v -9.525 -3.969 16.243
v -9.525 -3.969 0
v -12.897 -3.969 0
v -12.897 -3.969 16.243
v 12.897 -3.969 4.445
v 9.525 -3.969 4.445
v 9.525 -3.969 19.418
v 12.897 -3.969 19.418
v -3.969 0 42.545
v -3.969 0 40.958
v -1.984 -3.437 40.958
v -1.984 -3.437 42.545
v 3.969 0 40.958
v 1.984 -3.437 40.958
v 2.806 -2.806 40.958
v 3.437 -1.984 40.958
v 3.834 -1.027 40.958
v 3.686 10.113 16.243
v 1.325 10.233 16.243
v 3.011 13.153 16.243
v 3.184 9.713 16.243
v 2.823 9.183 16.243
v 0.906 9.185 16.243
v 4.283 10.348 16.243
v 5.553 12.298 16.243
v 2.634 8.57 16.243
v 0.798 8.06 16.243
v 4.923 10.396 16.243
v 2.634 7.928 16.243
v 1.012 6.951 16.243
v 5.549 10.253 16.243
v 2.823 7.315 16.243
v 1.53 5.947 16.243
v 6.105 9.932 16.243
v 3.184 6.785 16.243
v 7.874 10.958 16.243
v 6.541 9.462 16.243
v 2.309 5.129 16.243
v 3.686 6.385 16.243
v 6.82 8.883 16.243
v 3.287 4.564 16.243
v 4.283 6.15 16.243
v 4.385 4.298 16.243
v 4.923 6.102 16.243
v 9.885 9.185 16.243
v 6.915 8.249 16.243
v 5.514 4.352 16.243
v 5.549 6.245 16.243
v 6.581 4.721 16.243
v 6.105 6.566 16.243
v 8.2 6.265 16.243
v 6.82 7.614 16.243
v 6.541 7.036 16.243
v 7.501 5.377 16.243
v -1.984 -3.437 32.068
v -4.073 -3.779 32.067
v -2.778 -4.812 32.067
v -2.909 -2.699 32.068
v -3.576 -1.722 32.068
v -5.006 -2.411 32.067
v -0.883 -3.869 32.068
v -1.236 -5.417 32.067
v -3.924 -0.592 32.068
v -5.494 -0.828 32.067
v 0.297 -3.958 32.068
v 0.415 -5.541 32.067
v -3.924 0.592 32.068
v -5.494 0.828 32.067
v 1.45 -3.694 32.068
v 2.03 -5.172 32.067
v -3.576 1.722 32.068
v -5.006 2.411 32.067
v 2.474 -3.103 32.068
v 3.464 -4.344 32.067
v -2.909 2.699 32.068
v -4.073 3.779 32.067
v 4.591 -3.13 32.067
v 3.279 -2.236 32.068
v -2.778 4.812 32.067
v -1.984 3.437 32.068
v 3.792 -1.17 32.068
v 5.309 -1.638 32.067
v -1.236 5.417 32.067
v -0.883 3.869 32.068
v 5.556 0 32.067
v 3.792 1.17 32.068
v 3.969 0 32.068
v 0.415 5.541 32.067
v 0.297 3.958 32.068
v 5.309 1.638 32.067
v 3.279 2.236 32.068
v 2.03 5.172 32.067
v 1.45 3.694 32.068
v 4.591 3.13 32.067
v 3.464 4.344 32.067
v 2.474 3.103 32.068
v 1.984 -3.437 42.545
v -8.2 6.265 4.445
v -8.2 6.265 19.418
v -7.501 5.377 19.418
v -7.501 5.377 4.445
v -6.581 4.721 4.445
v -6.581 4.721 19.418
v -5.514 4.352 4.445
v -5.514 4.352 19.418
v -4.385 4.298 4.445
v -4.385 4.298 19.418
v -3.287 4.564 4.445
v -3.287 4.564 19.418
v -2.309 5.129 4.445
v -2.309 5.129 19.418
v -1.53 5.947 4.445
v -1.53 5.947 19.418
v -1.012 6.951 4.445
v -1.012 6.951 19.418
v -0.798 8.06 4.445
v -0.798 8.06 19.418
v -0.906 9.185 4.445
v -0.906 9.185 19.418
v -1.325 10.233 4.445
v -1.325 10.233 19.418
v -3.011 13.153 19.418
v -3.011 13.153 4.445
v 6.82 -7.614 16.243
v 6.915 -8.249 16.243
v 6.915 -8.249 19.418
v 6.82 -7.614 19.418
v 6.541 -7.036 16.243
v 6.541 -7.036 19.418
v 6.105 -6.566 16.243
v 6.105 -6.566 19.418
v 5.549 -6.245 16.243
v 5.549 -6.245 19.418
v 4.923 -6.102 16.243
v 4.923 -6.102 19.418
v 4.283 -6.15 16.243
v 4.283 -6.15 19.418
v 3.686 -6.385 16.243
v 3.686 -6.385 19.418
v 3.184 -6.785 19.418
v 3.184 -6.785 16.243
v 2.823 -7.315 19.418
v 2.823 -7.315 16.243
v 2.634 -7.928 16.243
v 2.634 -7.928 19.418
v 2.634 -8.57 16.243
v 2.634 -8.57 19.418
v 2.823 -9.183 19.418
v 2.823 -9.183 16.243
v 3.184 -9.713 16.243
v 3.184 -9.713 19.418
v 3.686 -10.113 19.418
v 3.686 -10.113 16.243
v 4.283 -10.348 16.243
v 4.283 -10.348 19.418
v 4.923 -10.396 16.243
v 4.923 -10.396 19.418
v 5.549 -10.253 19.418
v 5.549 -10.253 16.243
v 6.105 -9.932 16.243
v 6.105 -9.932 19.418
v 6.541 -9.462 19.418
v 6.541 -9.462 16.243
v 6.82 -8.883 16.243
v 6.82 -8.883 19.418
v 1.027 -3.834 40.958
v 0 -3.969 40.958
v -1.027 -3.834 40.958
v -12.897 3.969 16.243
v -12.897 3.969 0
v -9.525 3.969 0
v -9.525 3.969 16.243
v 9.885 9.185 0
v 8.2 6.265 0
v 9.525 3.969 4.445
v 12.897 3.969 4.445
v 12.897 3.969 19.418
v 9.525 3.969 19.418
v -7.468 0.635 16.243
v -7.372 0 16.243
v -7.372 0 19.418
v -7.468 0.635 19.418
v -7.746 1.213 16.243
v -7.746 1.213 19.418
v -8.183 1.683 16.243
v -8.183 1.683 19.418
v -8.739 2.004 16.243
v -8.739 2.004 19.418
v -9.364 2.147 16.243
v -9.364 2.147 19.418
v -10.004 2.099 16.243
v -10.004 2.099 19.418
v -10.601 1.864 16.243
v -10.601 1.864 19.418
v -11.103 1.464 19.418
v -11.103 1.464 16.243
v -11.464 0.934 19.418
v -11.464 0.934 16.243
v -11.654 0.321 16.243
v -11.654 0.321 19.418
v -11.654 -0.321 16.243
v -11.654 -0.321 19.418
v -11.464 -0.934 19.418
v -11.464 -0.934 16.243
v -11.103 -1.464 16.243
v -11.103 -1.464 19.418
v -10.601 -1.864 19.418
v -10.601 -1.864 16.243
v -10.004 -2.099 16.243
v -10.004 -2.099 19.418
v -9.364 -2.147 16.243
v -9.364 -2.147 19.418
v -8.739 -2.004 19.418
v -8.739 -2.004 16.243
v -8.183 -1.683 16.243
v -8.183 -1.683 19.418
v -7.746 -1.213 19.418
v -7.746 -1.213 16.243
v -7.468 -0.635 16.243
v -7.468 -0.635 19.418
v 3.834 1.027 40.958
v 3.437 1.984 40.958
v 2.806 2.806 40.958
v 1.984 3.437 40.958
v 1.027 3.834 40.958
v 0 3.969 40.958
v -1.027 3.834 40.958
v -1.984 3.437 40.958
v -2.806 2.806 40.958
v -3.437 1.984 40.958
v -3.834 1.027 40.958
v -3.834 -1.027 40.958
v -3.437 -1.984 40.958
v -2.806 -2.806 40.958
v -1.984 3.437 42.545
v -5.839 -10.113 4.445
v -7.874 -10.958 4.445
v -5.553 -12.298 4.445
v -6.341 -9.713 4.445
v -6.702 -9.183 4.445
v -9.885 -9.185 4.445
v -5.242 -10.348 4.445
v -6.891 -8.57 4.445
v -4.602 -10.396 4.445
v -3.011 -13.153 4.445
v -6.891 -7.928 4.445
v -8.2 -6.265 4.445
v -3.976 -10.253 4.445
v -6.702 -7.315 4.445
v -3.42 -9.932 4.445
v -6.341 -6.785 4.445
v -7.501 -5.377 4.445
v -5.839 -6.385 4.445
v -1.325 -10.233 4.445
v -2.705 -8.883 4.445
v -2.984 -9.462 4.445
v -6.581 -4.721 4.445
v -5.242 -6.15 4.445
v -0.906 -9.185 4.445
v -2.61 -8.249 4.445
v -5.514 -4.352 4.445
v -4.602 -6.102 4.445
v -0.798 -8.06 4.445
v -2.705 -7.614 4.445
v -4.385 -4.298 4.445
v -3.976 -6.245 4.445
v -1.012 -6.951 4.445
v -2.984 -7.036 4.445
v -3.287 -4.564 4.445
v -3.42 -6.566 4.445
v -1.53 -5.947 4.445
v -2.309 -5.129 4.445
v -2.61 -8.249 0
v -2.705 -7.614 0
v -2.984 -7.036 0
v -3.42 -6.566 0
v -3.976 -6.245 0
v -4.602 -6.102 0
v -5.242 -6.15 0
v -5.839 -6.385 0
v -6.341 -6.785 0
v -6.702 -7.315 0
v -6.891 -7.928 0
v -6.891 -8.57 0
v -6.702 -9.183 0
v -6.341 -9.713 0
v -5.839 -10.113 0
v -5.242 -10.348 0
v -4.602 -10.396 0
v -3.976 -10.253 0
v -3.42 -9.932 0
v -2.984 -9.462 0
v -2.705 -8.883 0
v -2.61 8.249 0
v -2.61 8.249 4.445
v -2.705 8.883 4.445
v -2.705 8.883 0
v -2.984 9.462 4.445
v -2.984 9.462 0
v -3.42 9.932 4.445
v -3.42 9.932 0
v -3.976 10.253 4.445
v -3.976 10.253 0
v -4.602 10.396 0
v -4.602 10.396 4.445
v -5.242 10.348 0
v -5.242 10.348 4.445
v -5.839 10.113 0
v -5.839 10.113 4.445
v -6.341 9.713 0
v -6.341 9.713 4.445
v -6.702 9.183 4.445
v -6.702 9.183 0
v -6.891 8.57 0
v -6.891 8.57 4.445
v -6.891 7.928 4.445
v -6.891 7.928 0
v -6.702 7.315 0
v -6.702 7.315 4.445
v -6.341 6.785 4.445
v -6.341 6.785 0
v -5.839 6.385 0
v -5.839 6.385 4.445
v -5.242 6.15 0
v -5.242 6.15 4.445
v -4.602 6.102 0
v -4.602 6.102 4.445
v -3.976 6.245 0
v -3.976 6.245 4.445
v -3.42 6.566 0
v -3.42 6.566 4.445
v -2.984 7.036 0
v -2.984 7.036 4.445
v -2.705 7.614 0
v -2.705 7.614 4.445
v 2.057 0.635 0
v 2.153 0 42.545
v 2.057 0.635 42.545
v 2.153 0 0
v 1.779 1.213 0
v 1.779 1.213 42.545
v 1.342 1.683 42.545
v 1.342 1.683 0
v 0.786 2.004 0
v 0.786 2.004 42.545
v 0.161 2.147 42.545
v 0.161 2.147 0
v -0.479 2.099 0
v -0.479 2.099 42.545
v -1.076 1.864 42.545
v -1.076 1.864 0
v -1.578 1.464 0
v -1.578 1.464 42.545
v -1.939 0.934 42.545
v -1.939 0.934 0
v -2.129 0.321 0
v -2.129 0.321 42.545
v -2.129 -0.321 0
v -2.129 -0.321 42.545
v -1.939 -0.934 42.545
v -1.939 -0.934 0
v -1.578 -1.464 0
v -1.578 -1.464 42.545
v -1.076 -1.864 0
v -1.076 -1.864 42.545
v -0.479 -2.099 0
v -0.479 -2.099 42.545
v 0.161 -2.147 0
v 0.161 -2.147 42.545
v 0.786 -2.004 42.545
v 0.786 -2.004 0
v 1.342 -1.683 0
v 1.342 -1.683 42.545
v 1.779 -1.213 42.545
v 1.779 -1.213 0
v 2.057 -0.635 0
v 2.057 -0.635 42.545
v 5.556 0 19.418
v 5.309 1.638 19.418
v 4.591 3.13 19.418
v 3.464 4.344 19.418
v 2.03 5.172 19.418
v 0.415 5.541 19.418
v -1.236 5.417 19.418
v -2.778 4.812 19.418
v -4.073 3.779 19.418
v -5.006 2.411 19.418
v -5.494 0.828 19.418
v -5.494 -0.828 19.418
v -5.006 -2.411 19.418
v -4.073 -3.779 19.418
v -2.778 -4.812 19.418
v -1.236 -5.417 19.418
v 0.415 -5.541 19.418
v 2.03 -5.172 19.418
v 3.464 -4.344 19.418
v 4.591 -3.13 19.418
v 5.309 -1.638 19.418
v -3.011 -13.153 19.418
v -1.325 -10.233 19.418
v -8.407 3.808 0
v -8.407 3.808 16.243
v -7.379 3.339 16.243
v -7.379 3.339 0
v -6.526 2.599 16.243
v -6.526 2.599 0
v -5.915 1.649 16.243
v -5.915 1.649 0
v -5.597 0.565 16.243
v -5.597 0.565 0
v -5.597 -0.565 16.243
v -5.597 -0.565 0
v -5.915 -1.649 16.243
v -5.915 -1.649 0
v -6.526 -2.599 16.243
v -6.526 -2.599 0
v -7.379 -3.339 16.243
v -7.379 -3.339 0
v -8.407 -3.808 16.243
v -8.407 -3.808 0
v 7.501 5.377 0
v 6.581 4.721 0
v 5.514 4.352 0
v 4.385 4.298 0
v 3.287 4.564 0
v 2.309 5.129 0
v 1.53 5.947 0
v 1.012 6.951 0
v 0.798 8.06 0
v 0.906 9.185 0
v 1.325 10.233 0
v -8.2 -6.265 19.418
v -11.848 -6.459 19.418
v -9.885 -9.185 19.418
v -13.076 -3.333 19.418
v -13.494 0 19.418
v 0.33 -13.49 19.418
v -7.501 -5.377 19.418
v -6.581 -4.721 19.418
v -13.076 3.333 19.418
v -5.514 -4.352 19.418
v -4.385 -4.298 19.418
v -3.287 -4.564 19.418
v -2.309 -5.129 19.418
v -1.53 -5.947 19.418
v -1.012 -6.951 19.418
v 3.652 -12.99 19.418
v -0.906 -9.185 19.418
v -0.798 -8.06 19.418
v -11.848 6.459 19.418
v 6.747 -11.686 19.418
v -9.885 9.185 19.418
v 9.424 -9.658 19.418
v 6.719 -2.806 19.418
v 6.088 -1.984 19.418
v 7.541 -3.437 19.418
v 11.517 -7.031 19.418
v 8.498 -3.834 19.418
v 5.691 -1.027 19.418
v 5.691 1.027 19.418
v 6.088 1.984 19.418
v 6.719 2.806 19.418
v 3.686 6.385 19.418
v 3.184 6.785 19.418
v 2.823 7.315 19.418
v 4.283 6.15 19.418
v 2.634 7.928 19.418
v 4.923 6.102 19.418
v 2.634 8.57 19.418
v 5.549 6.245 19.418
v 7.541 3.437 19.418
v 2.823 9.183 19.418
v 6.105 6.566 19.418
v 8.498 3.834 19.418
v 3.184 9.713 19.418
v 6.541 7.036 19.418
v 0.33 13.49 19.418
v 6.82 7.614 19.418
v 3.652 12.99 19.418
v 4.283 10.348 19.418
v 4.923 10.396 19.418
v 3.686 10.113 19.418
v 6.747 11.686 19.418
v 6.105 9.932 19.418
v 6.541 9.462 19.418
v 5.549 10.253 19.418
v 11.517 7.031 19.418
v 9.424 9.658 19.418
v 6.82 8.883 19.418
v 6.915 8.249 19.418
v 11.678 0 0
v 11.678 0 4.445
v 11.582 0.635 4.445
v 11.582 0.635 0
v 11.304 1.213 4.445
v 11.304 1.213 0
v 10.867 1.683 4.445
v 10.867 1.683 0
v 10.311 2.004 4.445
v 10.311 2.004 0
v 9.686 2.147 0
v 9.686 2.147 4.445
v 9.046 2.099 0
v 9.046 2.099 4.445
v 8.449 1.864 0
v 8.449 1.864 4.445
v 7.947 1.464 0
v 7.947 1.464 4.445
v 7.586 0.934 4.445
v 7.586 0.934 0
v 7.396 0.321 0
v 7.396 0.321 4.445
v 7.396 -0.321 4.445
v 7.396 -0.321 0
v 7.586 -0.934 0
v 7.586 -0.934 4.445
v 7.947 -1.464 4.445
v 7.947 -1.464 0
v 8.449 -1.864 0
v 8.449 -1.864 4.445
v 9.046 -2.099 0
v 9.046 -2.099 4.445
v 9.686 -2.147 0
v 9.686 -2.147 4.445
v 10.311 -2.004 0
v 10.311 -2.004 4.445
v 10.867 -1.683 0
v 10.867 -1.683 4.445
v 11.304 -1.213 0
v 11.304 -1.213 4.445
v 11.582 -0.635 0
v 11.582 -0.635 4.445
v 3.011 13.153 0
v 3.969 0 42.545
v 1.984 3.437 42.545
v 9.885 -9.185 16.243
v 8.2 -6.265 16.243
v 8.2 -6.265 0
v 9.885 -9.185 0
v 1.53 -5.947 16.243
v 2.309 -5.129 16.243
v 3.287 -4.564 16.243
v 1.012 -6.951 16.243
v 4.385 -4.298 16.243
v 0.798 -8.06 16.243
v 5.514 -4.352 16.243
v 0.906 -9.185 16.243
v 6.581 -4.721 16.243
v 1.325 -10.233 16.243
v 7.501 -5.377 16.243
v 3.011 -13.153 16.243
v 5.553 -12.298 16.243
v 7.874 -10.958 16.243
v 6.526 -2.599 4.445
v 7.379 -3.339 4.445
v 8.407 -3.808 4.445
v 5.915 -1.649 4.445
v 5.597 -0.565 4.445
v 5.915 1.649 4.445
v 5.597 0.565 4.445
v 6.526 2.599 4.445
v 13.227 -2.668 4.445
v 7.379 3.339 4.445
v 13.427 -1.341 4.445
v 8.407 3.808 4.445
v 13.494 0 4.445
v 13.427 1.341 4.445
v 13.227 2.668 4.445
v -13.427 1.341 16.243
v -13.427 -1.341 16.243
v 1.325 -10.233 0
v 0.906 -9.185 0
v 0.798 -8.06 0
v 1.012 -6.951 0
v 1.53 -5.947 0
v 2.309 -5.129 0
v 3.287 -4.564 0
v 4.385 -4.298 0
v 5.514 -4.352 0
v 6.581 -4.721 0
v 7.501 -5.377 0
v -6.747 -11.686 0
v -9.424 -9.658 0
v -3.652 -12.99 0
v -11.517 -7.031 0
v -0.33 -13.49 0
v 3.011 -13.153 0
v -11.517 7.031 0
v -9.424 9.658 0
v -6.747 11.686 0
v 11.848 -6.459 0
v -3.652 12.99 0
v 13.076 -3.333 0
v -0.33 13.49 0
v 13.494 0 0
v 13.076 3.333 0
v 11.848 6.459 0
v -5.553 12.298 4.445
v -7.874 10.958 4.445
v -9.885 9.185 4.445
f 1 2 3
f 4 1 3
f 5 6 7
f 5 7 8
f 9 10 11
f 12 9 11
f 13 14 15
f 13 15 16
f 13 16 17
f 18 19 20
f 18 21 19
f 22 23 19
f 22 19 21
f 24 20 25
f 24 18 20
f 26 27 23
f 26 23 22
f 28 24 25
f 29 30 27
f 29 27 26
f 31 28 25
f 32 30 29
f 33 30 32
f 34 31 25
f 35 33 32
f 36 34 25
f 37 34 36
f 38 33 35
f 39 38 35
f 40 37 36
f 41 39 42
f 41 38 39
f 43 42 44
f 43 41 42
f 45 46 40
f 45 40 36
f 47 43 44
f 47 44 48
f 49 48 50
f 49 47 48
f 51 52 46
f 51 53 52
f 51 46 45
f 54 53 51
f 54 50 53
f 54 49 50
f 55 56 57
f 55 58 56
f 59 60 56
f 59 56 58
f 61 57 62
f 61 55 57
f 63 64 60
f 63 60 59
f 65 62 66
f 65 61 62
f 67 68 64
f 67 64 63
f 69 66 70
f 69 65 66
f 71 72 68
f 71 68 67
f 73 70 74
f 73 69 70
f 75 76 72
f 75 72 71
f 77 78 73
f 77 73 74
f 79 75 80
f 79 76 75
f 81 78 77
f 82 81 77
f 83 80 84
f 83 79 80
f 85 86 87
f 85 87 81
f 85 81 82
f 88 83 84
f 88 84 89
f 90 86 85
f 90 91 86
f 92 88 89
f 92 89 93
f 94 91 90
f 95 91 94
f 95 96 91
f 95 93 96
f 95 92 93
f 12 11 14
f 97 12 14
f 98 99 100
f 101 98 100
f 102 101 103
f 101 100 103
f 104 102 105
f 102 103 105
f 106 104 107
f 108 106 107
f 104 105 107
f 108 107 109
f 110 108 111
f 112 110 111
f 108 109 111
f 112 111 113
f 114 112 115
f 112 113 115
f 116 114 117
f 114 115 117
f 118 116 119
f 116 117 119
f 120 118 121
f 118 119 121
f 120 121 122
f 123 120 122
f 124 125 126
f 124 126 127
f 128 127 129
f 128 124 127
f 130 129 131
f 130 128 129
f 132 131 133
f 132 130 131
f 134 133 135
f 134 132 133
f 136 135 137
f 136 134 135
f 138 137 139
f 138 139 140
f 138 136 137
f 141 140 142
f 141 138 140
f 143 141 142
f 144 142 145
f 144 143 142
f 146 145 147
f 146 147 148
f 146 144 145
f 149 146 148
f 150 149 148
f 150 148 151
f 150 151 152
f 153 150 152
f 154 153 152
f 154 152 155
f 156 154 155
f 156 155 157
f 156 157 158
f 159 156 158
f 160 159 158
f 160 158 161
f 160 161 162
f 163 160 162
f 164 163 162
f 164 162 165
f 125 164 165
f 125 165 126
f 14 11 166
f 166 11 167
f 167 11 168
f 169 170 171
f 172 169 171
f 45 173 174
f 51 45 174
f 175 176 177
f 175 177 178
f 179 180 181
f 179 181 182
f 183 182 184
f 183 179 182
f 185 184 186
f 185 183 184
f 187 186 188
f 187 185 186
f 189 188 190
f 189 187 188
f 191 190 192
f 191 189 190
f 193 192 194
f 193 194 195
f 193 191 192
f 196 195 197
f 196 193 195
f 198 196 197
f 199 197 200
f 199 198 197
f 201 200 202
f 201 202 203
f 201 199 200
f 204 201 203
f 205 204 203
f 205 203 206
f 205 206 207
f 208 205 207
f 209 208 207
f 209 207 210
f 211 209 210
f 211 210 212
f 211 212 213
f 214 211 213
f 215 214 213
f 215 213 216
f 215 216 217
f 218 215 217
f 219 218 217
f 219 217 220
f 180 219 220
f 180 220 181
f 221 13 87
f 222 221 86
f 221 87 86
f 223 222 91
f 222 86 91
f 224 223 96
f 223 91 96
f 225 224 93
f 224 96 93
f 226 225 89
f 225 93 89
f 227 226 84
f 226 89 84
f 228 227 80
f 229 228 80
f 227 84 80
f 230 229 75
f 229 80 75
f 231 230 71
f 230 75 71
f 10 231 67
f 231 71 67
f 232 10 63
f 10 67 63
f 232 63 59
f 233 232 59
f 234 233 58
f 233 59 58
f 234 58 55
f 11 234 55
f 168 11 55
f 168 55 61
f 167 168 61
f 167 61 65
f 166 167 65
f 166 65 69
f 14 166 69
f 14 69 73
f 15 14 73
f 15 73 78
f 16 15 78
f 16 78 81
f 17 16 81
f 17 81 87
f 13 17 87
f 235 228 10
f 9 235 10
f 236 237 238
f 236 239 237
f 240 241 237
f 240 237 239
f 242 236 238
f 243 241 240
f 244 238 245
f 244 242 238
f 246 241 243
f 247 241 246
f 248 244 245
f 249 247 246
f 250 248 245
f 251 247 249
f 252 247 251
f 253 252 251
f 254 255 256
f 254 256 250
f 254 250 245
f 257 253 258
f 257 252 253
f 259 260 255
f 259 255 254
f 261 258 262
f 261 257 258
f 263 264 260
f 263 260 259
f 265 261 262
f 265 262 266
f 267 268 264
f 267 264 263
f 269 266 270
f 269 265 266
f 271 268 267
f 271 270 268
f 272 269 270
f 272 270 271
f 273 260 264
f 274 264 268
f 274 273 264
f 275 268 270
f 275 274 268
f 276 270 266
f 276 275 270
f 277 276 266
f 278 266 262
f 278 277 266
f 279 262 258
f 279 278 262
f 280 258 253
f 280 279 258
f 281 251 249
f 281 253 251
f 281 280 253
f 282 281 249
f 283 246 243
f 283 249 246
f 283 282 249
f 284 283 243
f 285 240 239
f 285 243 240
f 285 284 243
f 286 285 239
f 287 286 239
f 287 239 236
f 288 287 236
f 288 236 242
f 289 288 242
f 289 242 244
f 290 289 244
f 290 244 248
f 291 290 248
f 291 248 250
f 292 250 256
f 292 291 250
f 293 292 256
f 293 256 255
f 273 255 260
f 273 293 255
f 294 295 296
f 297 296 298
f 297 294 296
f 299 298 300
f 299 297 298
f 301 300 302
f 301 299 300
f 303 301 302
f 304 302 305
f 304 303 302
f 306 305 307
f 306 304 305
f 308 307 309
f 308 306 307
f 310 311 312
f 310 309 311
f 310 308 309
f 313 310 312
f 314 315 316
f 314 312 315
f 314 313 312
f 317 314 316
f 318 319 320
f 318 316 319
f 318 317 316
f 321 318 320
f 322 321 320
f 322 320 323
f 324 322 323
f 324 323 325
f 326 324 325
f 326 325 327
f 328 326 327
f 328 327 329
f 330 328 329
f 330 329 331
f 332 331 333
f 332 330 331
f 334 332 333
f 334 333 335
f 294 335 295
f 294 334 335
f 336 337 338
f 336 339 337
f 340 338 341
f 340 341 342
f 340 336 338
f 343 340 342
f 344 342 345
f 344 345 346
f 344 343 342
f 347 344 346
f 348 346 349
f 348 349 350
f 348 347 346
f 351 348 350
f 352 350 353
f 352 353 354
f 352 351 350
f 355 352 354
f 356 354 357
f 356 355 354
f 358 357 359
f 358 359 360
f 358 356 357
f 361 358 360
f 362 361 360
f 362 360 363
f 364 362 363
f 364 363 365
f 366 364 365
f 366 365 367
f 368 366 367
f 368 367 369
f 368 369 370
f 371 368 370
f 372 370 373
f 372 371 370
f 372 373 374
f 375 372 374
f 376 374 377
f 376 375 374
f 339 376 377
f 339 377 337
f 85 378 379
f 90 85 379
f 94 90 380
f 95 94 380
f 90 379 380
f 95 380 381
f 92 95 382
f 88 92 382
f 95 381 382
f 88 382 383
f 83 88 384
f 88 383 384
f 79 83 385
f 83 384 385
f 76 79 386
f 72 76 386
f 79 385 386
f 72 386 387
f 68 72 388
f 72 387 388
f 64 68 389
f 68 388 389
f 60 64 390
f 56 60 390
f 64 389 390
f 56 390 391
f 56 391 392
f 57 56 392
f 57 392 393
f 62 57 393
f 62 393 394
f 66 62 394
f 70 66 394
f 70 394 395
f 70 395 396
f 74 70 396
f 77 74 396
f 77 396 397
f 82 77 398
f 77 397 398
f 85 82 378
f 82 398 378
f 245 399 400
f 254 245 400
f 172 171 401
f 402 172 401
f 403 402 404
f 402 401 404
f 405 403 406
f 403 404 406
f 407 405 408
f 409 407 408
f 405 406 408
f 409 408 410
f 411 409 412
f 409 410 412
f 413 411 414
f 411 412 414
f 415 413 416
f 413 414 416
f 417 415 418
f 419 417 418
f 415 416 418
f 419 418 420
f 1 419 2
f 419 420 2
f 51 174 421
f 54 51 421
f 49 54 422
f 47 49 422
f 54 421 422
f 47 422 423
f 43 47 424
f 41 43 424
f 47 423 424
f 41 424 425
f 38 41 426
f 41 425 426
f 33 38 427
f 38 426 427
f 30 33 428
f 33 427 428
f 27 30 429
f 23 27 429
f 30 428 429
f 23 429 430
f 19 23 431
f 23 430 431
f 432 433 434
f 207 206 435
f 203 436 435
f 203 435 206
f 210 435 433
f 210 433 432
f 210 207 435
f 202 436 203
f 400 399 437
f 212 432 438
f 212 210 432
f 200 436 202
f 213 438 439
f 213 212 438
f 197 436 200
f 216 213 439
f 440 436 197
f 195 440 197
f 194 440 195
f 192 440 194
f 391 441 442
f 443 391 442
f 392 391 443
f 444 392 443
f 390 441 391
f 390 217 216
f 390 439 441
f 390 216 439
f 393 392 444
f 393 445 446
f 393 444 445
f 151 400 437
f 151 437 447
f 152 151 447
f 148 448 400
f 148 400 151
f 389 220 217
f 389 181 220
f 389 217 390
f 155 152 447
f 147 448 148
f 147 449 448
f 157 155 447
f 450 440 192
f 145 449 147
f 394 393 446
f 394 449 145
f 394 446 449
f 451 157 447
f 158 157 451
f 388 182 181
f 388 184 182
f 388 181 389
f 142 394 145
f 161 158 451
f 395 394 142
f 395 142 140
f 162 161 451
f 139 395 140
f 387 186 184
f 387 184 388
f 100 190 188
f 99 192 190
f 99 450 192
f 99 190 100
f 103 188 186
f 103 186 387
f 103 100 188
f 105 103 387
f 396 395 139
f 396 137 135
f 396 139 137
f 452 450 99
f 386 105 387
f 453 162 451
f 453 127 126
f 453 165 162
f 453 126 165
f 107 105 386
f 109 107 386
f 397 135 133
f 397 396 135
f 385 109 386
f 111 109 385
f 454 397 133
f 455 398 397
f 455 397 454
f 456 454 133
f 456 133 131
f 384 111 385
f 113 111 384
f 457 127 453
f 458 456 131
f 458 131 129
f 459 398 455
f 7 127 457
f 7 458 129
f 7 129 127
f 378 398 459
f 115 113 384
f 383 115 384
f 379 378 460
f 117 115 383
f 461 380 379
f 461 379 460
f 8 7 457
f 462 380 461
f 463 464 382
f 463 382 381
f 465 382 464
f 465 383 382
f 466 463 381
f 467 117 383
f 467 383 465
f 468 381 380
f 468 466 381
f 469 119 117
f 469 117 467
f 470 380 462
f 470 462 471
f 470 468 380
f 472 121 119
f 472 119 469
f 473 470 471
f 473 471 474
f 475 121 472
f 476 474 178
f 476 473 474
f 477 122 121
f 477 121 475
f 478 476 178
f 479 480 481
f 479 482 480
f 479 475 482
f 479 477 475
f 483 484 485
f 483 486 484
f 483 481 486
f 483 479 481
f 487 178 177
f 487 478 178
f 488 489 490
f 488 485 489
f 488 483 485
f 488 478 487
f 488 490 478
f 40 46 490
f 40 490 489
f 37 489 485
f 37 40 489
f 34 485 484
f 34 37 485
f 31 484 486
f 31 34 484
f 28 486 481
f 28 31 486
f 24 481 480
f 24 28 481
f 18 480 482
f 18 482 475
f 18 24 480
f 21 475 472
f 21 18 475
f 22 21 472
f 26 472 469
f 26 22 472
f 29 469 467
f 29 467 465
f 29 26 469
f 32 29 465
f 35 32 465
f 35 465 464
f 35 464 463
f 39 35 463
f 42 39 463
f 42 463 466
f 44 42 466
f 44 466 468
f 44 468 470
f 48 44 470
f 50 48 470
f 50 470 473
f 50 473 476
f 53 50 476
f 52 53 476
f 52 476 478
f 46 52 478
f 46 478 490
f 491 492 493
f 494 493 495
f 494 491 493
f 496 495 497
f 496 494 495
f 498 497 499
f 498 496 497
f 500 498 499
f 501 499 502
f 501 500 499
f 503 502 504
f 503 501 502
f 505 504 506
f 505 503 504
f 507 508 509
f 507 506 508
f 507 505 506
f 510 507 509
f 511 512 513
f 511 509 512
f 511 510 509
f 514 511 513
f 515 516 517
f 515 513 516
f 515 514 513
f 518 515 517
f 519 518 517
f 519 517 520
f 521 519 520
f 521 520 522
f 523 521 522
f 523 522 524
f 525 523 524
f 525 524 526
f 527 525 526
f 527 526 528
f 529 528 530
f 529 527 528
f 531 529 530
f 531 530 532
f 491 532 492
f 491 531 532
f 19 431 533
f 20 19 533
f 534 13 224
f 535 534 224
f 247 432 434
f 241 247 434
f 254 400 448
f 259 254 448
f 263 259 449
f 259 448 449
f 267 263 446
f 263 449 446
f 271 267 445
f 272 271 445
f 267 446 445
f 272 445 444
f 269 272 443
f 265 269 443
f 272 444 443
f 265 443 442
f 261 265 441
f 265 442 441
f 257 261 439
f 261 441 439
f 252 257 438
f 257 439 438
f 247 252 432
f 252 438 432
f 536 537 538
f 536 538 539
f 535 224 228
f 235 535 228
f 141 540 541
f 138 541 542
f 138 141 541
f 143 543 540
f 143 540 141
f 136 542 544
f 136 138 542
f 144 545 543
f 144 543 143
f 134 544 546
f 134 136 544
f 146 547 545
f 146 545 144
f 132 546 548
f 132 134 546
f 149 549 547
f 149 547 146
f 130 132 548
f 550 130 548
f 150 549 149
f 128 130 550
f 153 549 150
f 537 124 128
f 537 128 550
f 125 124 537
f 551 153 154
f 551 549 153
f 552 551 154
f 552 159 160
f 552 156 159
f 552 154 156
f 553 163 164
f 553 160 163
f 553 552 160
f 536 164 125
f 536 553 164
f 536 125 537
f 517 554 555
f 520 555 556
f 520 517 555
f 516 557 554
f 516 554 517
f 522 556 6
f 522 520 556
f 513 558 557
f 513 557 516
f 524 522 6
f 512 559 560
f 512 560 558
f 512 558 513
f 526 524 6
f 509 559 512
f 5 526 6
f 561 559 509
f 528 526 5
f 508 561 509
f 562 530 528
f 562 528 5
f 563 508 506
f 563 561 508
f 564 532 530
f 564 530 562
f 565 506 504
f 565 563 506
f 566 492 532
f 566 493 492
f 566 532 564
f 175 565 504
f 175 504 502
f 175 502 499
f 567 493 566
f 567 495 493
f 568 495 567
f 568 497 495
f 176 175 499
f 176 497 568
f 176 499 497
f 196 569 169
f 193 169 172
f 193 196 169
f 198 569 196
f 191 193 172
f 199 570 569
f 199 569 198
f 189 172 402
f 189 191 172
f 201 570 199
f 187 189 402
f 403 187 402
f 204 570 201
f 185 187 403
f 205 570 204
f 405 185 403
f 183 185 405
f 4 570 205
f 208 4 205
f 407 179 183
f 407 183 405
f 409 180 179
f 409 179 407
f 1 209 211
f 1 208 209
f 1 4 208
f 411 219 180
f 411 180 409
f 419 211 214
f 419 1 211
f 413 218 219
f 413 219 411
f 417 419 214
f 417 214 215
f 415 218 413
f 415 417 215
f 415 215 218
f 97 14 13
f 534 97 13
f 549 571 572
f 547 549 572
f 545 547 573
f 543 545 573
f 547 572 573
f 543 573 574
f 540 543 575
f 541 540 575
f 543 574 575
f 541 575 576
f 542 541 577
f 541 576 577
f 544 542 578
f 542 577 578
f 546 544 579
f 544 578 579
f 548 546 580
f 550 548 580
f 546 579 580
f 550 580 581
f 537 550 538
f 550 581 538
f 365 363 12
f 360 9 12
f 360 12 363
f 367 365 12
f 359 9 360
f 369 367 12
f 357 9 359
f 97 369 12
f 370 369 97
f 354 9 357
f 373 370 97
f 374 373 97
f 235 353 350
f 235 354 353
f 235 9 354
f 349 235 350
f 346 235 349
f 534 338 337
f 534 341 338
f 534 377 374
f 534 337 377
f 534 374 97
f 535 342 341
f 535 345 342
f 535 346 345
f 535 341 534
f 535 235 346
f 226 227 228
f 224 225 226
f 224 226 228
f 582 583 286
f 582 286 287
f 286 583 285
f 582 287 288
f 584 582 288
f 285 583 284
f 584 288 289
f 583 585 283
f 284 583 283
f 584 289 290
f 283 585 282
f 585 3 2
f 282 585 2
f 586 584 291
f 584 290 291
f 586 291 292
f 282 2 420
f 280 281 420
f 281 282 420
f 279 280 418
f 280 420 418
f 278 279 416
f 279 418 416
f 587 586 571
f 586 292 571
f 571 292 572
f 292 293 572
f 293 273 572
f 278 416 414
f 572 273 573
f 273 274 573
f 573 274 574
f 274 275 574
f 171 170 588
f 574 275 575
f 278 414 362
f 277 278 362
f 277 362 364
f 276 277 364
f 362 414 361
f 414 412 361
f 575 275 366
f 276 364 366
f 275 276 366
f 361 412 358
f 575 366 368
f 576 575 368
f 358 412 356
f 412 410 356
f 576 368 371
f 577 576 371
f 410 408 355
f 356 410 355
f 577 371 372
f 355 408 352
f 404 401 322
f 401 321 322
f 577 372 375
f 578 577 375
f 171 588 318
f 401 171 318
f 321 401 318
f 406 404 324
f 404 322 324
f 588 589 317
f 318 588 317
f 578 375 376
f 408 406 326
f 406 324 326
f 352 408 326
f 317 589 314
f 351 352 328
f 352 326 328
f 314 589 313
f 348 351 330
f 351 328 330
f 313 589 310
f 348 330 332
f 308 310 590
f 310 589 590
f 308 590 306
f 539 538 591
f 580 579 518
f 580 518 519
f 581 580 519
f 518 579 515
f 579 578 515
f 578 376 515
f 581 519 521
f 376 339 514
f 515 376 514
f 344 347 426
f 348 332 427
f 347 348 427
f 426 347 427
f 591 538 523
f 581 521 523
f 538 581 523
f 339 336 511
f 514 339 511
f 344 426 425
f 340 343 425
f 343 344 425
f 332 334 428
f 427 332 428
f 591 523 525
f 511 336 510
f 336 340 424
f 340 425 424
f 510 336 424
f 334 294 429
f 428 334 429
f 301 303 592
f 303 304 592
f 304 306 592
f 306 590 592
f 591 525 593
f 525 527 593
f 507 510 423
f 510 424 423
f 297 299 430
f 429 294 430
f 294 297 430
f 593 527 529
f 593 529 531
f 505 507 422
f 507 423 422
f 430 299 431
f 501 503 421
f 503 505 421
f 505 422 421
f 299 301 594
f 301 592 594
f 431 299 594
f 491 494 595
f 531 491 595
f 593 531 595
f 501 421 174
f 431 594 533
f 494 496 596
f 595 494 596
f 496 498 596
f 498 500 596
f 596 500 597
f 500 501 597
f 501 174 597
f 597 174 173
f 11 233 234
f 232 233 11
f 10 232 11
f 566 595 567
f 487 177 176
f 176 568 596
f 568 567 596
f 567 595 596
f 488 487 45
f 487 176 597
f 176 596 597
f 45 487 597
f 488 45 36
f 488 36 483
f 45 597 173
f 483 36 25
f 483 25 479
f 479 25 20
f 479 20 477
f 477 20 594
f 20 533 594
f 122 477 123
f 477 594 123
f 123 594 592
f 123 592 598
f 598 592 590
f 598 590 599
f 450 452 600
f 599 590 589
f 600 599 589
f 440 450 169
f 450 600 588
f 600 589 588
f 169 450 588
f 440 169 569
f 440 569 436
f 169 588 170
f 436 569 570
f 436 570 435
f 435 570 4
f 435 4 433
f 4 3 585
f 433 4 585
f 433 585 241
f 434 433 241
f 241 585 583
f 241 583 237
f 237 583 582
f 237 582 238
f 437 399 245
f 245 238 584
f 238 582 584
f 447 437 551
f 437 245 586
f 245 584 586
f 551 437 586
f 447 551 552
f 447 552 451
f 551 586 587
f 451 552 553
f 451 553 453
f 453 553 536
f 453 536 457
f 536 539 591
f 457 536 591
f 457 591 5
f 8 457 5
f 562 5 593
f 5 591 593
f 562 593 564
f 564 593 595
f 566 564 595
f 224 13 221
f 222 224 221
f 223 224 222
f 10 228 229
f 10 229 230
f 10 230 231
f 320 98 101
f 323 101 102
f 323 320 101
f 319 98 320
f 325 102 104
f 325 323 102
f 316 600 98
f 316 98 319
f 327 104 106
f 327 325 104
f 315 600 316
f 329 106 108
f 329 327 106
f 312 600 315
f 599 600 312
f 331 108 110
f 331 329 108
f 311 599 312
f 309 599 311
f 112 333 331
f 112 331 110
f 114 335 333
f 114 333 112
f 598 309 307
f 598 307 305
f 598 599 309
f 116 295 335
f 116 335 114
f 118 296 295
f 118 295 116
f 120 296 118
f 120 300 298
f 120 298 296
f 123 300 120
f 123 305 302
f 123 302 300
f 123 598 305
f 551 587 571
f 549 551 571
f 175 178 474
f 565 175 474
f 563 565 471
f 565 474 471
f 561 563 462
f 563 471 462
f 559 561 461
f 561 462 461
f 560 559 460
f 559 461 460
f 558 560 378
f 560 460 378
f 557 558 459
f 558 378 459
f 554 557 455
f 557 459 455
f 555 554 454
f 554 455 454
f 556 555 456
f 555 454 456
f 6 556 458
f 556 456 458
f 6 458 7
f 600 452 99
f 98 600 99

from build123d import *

# Parameters (mm, degrees)
F0_R      = 13.49375
F0_R_2    = 2.15265
F1_DEPTH  = 19.4183
F5_DEPTH  = 14.9733
F7_DEPTH  = 16.2433
F8_R      = 5.55625
F8_R_2    = 2.15265
F9_DEPTH  = 12.6492
F10_R     = 3.96875
F10_R_2   = 2.15265
F11_DEPTH = 8.89
F12_R     = 2.15265
F13_DEPTH = 1.5875


with BuildPart() as f1:
    # F0 (on Top) → F1 (new body)
    with BuildSketch(Plane.XY):
        Circle(F0_R)
        with Locations((-4.7625, -8.248892)):
            Circle(F0_R_2, mode=Mode.SUBTRACT)
        with Locations((4.7625, -8.248892)):
            Circle(F0_R_2, mode=Mode.SUBTRACT)
        with Locations((-9.525, 0)):
            Circle(F0_R_2, mode=Mode.SUBTRACT)
        with Locations((-4.7625, 8.248892)):
            Circle(F0_R_2, mode=Mode.SUBTRACT)
        Circle(F0_R_2, mode=Mode.SUBTRACT)
        with Locations((9.525, 0)):
            Circle(F0_R_2, mode=Mode.SUBTRACT)
        with Locations((4.7625, 8.248892)):
            Circle(F0_R_2, mode=Mode.SUBTRACT)
    extrude(amount=F1_DEPTH)

    # F4 (on face) → F5 (cut, through all)
    with BuildSketch(Plane.XY.offset(19.4183)):
        with BuildLine():
            Line((-3.309837, 13.670305), (-10.183913, 9.701555))
            Line((-10.183913, 9.701555), (-8.199538, 6.264517))
            ThreePointArc((-8.199538, 6.264517), (-2.778125, 4.811854), (-1.325462, 10.233267))
            Line((-1.325462, 10.233267), (-3.309837, 13.670305))
        make_face()
        with BuildLine():
            Line((13.49375, 3.96875), (9.525, 3.96875))
            ThreePointArc((9.525, 3.96875), (5.55625, 0), (9.525, -3.96875))
            Line((9.525, -3.96875), (13.49375, -3.96875))
            Line((13.49375, -3.96875), (13.49375, 3.96875))
        make_face()
        with BuildLine():
            Line((-8.199538, -6.264517), (-10.183913, -9.701555))
            Line((-10.183913, -9.701555), (-3.309837, -13.670305))
            Line((-3.309837, -13.670305), (-1.325462, -10.233267))
            ThreePointArc((-1.325462, -10.233267), (-2.778125, -4.811854), (-8.199538, -6.264517))
        make_face()
    extrude(amount=-F5_DEPTH, mode=Mode.SUBTRACT)

    # F6 (on face) → F7 (cut, through all)
    with BuildSketch(Plane(origin=(0, 0, 0), x_dir=(1, 0, 0), z_dir=(0, 0, -1))):
        with BuildLine():
            Line((1.325462, -10.233267), (3.309837, -13.670305))
            Line((3.309837, -13.670305), (10.183913, -9.701555))
            Line((10.183913, -9.701555), (8.199538, -6.264517))
            ThreePointArc((8.199538, -6.264517), (2.778125, -4.811854), (1.325462, -10.233267))
        make_face()
        with BuildLine():
            Line((10.183913, 9.701555), (3.309837, 13.670305))
            Line((3.309837, 13.670305), (1.325462, 10.233267))
            ThreePointArc((1.325462, 10.233267), (2.778125, 4.811854), (8.199538, 6.264517))
            Line((8.199538, 6.264517), (10.183913, 9.701555))
        make_face()
        with BuildLine():
            Line((-9.525, 3.96875), (-13.49375, 3.96875))
            Line((-13.49375, 3.96875), (-13.49375, -3.96875))
            Line((-13.49375, -3.96875), (-9.525, -3.96875))
            ThreePointArc((-9.525, -3.96875), (-5.55625, 0), (-9.525, 3.96875))
        make_face()
    extrude(amount=-F7_DEPTH, mode=Mode.SUBTRACT)

    # F8 (on face) → F9 (join)
    with BuildSketch(Plane.XY.offset(19.4183)):
        Circle(F8_R)
        Circle(F8_R_2, mode=Mode.SUBTRACT)
    extrude(amount=F9_DEPTH)

    # F10 (on face) → F11 (join)
    with BuildSketch(Plane.XY.offset(32.0675)):
        Circle(F10_R)
        Circle(F10_R_2, mode=Mode.SUBTRACT)
    extrude(amount=F11_DEPTH)

    # F12 (on face) → F13 (join)
    with BuildSketch(Plane.XY.offset(40.9575)):
        Polygon((1.984375, 3.437038), (-1.984375, 3.437038), (-3.96875, 0), (-1.984375, -3.437038), (1.984375, -3.437038), (3.96875, 0), align=None)
        Circle(F12_R, mode=Mode.SUBTRACT)
    extrude(amount=F13_DEPTH)


solid = f1.part
